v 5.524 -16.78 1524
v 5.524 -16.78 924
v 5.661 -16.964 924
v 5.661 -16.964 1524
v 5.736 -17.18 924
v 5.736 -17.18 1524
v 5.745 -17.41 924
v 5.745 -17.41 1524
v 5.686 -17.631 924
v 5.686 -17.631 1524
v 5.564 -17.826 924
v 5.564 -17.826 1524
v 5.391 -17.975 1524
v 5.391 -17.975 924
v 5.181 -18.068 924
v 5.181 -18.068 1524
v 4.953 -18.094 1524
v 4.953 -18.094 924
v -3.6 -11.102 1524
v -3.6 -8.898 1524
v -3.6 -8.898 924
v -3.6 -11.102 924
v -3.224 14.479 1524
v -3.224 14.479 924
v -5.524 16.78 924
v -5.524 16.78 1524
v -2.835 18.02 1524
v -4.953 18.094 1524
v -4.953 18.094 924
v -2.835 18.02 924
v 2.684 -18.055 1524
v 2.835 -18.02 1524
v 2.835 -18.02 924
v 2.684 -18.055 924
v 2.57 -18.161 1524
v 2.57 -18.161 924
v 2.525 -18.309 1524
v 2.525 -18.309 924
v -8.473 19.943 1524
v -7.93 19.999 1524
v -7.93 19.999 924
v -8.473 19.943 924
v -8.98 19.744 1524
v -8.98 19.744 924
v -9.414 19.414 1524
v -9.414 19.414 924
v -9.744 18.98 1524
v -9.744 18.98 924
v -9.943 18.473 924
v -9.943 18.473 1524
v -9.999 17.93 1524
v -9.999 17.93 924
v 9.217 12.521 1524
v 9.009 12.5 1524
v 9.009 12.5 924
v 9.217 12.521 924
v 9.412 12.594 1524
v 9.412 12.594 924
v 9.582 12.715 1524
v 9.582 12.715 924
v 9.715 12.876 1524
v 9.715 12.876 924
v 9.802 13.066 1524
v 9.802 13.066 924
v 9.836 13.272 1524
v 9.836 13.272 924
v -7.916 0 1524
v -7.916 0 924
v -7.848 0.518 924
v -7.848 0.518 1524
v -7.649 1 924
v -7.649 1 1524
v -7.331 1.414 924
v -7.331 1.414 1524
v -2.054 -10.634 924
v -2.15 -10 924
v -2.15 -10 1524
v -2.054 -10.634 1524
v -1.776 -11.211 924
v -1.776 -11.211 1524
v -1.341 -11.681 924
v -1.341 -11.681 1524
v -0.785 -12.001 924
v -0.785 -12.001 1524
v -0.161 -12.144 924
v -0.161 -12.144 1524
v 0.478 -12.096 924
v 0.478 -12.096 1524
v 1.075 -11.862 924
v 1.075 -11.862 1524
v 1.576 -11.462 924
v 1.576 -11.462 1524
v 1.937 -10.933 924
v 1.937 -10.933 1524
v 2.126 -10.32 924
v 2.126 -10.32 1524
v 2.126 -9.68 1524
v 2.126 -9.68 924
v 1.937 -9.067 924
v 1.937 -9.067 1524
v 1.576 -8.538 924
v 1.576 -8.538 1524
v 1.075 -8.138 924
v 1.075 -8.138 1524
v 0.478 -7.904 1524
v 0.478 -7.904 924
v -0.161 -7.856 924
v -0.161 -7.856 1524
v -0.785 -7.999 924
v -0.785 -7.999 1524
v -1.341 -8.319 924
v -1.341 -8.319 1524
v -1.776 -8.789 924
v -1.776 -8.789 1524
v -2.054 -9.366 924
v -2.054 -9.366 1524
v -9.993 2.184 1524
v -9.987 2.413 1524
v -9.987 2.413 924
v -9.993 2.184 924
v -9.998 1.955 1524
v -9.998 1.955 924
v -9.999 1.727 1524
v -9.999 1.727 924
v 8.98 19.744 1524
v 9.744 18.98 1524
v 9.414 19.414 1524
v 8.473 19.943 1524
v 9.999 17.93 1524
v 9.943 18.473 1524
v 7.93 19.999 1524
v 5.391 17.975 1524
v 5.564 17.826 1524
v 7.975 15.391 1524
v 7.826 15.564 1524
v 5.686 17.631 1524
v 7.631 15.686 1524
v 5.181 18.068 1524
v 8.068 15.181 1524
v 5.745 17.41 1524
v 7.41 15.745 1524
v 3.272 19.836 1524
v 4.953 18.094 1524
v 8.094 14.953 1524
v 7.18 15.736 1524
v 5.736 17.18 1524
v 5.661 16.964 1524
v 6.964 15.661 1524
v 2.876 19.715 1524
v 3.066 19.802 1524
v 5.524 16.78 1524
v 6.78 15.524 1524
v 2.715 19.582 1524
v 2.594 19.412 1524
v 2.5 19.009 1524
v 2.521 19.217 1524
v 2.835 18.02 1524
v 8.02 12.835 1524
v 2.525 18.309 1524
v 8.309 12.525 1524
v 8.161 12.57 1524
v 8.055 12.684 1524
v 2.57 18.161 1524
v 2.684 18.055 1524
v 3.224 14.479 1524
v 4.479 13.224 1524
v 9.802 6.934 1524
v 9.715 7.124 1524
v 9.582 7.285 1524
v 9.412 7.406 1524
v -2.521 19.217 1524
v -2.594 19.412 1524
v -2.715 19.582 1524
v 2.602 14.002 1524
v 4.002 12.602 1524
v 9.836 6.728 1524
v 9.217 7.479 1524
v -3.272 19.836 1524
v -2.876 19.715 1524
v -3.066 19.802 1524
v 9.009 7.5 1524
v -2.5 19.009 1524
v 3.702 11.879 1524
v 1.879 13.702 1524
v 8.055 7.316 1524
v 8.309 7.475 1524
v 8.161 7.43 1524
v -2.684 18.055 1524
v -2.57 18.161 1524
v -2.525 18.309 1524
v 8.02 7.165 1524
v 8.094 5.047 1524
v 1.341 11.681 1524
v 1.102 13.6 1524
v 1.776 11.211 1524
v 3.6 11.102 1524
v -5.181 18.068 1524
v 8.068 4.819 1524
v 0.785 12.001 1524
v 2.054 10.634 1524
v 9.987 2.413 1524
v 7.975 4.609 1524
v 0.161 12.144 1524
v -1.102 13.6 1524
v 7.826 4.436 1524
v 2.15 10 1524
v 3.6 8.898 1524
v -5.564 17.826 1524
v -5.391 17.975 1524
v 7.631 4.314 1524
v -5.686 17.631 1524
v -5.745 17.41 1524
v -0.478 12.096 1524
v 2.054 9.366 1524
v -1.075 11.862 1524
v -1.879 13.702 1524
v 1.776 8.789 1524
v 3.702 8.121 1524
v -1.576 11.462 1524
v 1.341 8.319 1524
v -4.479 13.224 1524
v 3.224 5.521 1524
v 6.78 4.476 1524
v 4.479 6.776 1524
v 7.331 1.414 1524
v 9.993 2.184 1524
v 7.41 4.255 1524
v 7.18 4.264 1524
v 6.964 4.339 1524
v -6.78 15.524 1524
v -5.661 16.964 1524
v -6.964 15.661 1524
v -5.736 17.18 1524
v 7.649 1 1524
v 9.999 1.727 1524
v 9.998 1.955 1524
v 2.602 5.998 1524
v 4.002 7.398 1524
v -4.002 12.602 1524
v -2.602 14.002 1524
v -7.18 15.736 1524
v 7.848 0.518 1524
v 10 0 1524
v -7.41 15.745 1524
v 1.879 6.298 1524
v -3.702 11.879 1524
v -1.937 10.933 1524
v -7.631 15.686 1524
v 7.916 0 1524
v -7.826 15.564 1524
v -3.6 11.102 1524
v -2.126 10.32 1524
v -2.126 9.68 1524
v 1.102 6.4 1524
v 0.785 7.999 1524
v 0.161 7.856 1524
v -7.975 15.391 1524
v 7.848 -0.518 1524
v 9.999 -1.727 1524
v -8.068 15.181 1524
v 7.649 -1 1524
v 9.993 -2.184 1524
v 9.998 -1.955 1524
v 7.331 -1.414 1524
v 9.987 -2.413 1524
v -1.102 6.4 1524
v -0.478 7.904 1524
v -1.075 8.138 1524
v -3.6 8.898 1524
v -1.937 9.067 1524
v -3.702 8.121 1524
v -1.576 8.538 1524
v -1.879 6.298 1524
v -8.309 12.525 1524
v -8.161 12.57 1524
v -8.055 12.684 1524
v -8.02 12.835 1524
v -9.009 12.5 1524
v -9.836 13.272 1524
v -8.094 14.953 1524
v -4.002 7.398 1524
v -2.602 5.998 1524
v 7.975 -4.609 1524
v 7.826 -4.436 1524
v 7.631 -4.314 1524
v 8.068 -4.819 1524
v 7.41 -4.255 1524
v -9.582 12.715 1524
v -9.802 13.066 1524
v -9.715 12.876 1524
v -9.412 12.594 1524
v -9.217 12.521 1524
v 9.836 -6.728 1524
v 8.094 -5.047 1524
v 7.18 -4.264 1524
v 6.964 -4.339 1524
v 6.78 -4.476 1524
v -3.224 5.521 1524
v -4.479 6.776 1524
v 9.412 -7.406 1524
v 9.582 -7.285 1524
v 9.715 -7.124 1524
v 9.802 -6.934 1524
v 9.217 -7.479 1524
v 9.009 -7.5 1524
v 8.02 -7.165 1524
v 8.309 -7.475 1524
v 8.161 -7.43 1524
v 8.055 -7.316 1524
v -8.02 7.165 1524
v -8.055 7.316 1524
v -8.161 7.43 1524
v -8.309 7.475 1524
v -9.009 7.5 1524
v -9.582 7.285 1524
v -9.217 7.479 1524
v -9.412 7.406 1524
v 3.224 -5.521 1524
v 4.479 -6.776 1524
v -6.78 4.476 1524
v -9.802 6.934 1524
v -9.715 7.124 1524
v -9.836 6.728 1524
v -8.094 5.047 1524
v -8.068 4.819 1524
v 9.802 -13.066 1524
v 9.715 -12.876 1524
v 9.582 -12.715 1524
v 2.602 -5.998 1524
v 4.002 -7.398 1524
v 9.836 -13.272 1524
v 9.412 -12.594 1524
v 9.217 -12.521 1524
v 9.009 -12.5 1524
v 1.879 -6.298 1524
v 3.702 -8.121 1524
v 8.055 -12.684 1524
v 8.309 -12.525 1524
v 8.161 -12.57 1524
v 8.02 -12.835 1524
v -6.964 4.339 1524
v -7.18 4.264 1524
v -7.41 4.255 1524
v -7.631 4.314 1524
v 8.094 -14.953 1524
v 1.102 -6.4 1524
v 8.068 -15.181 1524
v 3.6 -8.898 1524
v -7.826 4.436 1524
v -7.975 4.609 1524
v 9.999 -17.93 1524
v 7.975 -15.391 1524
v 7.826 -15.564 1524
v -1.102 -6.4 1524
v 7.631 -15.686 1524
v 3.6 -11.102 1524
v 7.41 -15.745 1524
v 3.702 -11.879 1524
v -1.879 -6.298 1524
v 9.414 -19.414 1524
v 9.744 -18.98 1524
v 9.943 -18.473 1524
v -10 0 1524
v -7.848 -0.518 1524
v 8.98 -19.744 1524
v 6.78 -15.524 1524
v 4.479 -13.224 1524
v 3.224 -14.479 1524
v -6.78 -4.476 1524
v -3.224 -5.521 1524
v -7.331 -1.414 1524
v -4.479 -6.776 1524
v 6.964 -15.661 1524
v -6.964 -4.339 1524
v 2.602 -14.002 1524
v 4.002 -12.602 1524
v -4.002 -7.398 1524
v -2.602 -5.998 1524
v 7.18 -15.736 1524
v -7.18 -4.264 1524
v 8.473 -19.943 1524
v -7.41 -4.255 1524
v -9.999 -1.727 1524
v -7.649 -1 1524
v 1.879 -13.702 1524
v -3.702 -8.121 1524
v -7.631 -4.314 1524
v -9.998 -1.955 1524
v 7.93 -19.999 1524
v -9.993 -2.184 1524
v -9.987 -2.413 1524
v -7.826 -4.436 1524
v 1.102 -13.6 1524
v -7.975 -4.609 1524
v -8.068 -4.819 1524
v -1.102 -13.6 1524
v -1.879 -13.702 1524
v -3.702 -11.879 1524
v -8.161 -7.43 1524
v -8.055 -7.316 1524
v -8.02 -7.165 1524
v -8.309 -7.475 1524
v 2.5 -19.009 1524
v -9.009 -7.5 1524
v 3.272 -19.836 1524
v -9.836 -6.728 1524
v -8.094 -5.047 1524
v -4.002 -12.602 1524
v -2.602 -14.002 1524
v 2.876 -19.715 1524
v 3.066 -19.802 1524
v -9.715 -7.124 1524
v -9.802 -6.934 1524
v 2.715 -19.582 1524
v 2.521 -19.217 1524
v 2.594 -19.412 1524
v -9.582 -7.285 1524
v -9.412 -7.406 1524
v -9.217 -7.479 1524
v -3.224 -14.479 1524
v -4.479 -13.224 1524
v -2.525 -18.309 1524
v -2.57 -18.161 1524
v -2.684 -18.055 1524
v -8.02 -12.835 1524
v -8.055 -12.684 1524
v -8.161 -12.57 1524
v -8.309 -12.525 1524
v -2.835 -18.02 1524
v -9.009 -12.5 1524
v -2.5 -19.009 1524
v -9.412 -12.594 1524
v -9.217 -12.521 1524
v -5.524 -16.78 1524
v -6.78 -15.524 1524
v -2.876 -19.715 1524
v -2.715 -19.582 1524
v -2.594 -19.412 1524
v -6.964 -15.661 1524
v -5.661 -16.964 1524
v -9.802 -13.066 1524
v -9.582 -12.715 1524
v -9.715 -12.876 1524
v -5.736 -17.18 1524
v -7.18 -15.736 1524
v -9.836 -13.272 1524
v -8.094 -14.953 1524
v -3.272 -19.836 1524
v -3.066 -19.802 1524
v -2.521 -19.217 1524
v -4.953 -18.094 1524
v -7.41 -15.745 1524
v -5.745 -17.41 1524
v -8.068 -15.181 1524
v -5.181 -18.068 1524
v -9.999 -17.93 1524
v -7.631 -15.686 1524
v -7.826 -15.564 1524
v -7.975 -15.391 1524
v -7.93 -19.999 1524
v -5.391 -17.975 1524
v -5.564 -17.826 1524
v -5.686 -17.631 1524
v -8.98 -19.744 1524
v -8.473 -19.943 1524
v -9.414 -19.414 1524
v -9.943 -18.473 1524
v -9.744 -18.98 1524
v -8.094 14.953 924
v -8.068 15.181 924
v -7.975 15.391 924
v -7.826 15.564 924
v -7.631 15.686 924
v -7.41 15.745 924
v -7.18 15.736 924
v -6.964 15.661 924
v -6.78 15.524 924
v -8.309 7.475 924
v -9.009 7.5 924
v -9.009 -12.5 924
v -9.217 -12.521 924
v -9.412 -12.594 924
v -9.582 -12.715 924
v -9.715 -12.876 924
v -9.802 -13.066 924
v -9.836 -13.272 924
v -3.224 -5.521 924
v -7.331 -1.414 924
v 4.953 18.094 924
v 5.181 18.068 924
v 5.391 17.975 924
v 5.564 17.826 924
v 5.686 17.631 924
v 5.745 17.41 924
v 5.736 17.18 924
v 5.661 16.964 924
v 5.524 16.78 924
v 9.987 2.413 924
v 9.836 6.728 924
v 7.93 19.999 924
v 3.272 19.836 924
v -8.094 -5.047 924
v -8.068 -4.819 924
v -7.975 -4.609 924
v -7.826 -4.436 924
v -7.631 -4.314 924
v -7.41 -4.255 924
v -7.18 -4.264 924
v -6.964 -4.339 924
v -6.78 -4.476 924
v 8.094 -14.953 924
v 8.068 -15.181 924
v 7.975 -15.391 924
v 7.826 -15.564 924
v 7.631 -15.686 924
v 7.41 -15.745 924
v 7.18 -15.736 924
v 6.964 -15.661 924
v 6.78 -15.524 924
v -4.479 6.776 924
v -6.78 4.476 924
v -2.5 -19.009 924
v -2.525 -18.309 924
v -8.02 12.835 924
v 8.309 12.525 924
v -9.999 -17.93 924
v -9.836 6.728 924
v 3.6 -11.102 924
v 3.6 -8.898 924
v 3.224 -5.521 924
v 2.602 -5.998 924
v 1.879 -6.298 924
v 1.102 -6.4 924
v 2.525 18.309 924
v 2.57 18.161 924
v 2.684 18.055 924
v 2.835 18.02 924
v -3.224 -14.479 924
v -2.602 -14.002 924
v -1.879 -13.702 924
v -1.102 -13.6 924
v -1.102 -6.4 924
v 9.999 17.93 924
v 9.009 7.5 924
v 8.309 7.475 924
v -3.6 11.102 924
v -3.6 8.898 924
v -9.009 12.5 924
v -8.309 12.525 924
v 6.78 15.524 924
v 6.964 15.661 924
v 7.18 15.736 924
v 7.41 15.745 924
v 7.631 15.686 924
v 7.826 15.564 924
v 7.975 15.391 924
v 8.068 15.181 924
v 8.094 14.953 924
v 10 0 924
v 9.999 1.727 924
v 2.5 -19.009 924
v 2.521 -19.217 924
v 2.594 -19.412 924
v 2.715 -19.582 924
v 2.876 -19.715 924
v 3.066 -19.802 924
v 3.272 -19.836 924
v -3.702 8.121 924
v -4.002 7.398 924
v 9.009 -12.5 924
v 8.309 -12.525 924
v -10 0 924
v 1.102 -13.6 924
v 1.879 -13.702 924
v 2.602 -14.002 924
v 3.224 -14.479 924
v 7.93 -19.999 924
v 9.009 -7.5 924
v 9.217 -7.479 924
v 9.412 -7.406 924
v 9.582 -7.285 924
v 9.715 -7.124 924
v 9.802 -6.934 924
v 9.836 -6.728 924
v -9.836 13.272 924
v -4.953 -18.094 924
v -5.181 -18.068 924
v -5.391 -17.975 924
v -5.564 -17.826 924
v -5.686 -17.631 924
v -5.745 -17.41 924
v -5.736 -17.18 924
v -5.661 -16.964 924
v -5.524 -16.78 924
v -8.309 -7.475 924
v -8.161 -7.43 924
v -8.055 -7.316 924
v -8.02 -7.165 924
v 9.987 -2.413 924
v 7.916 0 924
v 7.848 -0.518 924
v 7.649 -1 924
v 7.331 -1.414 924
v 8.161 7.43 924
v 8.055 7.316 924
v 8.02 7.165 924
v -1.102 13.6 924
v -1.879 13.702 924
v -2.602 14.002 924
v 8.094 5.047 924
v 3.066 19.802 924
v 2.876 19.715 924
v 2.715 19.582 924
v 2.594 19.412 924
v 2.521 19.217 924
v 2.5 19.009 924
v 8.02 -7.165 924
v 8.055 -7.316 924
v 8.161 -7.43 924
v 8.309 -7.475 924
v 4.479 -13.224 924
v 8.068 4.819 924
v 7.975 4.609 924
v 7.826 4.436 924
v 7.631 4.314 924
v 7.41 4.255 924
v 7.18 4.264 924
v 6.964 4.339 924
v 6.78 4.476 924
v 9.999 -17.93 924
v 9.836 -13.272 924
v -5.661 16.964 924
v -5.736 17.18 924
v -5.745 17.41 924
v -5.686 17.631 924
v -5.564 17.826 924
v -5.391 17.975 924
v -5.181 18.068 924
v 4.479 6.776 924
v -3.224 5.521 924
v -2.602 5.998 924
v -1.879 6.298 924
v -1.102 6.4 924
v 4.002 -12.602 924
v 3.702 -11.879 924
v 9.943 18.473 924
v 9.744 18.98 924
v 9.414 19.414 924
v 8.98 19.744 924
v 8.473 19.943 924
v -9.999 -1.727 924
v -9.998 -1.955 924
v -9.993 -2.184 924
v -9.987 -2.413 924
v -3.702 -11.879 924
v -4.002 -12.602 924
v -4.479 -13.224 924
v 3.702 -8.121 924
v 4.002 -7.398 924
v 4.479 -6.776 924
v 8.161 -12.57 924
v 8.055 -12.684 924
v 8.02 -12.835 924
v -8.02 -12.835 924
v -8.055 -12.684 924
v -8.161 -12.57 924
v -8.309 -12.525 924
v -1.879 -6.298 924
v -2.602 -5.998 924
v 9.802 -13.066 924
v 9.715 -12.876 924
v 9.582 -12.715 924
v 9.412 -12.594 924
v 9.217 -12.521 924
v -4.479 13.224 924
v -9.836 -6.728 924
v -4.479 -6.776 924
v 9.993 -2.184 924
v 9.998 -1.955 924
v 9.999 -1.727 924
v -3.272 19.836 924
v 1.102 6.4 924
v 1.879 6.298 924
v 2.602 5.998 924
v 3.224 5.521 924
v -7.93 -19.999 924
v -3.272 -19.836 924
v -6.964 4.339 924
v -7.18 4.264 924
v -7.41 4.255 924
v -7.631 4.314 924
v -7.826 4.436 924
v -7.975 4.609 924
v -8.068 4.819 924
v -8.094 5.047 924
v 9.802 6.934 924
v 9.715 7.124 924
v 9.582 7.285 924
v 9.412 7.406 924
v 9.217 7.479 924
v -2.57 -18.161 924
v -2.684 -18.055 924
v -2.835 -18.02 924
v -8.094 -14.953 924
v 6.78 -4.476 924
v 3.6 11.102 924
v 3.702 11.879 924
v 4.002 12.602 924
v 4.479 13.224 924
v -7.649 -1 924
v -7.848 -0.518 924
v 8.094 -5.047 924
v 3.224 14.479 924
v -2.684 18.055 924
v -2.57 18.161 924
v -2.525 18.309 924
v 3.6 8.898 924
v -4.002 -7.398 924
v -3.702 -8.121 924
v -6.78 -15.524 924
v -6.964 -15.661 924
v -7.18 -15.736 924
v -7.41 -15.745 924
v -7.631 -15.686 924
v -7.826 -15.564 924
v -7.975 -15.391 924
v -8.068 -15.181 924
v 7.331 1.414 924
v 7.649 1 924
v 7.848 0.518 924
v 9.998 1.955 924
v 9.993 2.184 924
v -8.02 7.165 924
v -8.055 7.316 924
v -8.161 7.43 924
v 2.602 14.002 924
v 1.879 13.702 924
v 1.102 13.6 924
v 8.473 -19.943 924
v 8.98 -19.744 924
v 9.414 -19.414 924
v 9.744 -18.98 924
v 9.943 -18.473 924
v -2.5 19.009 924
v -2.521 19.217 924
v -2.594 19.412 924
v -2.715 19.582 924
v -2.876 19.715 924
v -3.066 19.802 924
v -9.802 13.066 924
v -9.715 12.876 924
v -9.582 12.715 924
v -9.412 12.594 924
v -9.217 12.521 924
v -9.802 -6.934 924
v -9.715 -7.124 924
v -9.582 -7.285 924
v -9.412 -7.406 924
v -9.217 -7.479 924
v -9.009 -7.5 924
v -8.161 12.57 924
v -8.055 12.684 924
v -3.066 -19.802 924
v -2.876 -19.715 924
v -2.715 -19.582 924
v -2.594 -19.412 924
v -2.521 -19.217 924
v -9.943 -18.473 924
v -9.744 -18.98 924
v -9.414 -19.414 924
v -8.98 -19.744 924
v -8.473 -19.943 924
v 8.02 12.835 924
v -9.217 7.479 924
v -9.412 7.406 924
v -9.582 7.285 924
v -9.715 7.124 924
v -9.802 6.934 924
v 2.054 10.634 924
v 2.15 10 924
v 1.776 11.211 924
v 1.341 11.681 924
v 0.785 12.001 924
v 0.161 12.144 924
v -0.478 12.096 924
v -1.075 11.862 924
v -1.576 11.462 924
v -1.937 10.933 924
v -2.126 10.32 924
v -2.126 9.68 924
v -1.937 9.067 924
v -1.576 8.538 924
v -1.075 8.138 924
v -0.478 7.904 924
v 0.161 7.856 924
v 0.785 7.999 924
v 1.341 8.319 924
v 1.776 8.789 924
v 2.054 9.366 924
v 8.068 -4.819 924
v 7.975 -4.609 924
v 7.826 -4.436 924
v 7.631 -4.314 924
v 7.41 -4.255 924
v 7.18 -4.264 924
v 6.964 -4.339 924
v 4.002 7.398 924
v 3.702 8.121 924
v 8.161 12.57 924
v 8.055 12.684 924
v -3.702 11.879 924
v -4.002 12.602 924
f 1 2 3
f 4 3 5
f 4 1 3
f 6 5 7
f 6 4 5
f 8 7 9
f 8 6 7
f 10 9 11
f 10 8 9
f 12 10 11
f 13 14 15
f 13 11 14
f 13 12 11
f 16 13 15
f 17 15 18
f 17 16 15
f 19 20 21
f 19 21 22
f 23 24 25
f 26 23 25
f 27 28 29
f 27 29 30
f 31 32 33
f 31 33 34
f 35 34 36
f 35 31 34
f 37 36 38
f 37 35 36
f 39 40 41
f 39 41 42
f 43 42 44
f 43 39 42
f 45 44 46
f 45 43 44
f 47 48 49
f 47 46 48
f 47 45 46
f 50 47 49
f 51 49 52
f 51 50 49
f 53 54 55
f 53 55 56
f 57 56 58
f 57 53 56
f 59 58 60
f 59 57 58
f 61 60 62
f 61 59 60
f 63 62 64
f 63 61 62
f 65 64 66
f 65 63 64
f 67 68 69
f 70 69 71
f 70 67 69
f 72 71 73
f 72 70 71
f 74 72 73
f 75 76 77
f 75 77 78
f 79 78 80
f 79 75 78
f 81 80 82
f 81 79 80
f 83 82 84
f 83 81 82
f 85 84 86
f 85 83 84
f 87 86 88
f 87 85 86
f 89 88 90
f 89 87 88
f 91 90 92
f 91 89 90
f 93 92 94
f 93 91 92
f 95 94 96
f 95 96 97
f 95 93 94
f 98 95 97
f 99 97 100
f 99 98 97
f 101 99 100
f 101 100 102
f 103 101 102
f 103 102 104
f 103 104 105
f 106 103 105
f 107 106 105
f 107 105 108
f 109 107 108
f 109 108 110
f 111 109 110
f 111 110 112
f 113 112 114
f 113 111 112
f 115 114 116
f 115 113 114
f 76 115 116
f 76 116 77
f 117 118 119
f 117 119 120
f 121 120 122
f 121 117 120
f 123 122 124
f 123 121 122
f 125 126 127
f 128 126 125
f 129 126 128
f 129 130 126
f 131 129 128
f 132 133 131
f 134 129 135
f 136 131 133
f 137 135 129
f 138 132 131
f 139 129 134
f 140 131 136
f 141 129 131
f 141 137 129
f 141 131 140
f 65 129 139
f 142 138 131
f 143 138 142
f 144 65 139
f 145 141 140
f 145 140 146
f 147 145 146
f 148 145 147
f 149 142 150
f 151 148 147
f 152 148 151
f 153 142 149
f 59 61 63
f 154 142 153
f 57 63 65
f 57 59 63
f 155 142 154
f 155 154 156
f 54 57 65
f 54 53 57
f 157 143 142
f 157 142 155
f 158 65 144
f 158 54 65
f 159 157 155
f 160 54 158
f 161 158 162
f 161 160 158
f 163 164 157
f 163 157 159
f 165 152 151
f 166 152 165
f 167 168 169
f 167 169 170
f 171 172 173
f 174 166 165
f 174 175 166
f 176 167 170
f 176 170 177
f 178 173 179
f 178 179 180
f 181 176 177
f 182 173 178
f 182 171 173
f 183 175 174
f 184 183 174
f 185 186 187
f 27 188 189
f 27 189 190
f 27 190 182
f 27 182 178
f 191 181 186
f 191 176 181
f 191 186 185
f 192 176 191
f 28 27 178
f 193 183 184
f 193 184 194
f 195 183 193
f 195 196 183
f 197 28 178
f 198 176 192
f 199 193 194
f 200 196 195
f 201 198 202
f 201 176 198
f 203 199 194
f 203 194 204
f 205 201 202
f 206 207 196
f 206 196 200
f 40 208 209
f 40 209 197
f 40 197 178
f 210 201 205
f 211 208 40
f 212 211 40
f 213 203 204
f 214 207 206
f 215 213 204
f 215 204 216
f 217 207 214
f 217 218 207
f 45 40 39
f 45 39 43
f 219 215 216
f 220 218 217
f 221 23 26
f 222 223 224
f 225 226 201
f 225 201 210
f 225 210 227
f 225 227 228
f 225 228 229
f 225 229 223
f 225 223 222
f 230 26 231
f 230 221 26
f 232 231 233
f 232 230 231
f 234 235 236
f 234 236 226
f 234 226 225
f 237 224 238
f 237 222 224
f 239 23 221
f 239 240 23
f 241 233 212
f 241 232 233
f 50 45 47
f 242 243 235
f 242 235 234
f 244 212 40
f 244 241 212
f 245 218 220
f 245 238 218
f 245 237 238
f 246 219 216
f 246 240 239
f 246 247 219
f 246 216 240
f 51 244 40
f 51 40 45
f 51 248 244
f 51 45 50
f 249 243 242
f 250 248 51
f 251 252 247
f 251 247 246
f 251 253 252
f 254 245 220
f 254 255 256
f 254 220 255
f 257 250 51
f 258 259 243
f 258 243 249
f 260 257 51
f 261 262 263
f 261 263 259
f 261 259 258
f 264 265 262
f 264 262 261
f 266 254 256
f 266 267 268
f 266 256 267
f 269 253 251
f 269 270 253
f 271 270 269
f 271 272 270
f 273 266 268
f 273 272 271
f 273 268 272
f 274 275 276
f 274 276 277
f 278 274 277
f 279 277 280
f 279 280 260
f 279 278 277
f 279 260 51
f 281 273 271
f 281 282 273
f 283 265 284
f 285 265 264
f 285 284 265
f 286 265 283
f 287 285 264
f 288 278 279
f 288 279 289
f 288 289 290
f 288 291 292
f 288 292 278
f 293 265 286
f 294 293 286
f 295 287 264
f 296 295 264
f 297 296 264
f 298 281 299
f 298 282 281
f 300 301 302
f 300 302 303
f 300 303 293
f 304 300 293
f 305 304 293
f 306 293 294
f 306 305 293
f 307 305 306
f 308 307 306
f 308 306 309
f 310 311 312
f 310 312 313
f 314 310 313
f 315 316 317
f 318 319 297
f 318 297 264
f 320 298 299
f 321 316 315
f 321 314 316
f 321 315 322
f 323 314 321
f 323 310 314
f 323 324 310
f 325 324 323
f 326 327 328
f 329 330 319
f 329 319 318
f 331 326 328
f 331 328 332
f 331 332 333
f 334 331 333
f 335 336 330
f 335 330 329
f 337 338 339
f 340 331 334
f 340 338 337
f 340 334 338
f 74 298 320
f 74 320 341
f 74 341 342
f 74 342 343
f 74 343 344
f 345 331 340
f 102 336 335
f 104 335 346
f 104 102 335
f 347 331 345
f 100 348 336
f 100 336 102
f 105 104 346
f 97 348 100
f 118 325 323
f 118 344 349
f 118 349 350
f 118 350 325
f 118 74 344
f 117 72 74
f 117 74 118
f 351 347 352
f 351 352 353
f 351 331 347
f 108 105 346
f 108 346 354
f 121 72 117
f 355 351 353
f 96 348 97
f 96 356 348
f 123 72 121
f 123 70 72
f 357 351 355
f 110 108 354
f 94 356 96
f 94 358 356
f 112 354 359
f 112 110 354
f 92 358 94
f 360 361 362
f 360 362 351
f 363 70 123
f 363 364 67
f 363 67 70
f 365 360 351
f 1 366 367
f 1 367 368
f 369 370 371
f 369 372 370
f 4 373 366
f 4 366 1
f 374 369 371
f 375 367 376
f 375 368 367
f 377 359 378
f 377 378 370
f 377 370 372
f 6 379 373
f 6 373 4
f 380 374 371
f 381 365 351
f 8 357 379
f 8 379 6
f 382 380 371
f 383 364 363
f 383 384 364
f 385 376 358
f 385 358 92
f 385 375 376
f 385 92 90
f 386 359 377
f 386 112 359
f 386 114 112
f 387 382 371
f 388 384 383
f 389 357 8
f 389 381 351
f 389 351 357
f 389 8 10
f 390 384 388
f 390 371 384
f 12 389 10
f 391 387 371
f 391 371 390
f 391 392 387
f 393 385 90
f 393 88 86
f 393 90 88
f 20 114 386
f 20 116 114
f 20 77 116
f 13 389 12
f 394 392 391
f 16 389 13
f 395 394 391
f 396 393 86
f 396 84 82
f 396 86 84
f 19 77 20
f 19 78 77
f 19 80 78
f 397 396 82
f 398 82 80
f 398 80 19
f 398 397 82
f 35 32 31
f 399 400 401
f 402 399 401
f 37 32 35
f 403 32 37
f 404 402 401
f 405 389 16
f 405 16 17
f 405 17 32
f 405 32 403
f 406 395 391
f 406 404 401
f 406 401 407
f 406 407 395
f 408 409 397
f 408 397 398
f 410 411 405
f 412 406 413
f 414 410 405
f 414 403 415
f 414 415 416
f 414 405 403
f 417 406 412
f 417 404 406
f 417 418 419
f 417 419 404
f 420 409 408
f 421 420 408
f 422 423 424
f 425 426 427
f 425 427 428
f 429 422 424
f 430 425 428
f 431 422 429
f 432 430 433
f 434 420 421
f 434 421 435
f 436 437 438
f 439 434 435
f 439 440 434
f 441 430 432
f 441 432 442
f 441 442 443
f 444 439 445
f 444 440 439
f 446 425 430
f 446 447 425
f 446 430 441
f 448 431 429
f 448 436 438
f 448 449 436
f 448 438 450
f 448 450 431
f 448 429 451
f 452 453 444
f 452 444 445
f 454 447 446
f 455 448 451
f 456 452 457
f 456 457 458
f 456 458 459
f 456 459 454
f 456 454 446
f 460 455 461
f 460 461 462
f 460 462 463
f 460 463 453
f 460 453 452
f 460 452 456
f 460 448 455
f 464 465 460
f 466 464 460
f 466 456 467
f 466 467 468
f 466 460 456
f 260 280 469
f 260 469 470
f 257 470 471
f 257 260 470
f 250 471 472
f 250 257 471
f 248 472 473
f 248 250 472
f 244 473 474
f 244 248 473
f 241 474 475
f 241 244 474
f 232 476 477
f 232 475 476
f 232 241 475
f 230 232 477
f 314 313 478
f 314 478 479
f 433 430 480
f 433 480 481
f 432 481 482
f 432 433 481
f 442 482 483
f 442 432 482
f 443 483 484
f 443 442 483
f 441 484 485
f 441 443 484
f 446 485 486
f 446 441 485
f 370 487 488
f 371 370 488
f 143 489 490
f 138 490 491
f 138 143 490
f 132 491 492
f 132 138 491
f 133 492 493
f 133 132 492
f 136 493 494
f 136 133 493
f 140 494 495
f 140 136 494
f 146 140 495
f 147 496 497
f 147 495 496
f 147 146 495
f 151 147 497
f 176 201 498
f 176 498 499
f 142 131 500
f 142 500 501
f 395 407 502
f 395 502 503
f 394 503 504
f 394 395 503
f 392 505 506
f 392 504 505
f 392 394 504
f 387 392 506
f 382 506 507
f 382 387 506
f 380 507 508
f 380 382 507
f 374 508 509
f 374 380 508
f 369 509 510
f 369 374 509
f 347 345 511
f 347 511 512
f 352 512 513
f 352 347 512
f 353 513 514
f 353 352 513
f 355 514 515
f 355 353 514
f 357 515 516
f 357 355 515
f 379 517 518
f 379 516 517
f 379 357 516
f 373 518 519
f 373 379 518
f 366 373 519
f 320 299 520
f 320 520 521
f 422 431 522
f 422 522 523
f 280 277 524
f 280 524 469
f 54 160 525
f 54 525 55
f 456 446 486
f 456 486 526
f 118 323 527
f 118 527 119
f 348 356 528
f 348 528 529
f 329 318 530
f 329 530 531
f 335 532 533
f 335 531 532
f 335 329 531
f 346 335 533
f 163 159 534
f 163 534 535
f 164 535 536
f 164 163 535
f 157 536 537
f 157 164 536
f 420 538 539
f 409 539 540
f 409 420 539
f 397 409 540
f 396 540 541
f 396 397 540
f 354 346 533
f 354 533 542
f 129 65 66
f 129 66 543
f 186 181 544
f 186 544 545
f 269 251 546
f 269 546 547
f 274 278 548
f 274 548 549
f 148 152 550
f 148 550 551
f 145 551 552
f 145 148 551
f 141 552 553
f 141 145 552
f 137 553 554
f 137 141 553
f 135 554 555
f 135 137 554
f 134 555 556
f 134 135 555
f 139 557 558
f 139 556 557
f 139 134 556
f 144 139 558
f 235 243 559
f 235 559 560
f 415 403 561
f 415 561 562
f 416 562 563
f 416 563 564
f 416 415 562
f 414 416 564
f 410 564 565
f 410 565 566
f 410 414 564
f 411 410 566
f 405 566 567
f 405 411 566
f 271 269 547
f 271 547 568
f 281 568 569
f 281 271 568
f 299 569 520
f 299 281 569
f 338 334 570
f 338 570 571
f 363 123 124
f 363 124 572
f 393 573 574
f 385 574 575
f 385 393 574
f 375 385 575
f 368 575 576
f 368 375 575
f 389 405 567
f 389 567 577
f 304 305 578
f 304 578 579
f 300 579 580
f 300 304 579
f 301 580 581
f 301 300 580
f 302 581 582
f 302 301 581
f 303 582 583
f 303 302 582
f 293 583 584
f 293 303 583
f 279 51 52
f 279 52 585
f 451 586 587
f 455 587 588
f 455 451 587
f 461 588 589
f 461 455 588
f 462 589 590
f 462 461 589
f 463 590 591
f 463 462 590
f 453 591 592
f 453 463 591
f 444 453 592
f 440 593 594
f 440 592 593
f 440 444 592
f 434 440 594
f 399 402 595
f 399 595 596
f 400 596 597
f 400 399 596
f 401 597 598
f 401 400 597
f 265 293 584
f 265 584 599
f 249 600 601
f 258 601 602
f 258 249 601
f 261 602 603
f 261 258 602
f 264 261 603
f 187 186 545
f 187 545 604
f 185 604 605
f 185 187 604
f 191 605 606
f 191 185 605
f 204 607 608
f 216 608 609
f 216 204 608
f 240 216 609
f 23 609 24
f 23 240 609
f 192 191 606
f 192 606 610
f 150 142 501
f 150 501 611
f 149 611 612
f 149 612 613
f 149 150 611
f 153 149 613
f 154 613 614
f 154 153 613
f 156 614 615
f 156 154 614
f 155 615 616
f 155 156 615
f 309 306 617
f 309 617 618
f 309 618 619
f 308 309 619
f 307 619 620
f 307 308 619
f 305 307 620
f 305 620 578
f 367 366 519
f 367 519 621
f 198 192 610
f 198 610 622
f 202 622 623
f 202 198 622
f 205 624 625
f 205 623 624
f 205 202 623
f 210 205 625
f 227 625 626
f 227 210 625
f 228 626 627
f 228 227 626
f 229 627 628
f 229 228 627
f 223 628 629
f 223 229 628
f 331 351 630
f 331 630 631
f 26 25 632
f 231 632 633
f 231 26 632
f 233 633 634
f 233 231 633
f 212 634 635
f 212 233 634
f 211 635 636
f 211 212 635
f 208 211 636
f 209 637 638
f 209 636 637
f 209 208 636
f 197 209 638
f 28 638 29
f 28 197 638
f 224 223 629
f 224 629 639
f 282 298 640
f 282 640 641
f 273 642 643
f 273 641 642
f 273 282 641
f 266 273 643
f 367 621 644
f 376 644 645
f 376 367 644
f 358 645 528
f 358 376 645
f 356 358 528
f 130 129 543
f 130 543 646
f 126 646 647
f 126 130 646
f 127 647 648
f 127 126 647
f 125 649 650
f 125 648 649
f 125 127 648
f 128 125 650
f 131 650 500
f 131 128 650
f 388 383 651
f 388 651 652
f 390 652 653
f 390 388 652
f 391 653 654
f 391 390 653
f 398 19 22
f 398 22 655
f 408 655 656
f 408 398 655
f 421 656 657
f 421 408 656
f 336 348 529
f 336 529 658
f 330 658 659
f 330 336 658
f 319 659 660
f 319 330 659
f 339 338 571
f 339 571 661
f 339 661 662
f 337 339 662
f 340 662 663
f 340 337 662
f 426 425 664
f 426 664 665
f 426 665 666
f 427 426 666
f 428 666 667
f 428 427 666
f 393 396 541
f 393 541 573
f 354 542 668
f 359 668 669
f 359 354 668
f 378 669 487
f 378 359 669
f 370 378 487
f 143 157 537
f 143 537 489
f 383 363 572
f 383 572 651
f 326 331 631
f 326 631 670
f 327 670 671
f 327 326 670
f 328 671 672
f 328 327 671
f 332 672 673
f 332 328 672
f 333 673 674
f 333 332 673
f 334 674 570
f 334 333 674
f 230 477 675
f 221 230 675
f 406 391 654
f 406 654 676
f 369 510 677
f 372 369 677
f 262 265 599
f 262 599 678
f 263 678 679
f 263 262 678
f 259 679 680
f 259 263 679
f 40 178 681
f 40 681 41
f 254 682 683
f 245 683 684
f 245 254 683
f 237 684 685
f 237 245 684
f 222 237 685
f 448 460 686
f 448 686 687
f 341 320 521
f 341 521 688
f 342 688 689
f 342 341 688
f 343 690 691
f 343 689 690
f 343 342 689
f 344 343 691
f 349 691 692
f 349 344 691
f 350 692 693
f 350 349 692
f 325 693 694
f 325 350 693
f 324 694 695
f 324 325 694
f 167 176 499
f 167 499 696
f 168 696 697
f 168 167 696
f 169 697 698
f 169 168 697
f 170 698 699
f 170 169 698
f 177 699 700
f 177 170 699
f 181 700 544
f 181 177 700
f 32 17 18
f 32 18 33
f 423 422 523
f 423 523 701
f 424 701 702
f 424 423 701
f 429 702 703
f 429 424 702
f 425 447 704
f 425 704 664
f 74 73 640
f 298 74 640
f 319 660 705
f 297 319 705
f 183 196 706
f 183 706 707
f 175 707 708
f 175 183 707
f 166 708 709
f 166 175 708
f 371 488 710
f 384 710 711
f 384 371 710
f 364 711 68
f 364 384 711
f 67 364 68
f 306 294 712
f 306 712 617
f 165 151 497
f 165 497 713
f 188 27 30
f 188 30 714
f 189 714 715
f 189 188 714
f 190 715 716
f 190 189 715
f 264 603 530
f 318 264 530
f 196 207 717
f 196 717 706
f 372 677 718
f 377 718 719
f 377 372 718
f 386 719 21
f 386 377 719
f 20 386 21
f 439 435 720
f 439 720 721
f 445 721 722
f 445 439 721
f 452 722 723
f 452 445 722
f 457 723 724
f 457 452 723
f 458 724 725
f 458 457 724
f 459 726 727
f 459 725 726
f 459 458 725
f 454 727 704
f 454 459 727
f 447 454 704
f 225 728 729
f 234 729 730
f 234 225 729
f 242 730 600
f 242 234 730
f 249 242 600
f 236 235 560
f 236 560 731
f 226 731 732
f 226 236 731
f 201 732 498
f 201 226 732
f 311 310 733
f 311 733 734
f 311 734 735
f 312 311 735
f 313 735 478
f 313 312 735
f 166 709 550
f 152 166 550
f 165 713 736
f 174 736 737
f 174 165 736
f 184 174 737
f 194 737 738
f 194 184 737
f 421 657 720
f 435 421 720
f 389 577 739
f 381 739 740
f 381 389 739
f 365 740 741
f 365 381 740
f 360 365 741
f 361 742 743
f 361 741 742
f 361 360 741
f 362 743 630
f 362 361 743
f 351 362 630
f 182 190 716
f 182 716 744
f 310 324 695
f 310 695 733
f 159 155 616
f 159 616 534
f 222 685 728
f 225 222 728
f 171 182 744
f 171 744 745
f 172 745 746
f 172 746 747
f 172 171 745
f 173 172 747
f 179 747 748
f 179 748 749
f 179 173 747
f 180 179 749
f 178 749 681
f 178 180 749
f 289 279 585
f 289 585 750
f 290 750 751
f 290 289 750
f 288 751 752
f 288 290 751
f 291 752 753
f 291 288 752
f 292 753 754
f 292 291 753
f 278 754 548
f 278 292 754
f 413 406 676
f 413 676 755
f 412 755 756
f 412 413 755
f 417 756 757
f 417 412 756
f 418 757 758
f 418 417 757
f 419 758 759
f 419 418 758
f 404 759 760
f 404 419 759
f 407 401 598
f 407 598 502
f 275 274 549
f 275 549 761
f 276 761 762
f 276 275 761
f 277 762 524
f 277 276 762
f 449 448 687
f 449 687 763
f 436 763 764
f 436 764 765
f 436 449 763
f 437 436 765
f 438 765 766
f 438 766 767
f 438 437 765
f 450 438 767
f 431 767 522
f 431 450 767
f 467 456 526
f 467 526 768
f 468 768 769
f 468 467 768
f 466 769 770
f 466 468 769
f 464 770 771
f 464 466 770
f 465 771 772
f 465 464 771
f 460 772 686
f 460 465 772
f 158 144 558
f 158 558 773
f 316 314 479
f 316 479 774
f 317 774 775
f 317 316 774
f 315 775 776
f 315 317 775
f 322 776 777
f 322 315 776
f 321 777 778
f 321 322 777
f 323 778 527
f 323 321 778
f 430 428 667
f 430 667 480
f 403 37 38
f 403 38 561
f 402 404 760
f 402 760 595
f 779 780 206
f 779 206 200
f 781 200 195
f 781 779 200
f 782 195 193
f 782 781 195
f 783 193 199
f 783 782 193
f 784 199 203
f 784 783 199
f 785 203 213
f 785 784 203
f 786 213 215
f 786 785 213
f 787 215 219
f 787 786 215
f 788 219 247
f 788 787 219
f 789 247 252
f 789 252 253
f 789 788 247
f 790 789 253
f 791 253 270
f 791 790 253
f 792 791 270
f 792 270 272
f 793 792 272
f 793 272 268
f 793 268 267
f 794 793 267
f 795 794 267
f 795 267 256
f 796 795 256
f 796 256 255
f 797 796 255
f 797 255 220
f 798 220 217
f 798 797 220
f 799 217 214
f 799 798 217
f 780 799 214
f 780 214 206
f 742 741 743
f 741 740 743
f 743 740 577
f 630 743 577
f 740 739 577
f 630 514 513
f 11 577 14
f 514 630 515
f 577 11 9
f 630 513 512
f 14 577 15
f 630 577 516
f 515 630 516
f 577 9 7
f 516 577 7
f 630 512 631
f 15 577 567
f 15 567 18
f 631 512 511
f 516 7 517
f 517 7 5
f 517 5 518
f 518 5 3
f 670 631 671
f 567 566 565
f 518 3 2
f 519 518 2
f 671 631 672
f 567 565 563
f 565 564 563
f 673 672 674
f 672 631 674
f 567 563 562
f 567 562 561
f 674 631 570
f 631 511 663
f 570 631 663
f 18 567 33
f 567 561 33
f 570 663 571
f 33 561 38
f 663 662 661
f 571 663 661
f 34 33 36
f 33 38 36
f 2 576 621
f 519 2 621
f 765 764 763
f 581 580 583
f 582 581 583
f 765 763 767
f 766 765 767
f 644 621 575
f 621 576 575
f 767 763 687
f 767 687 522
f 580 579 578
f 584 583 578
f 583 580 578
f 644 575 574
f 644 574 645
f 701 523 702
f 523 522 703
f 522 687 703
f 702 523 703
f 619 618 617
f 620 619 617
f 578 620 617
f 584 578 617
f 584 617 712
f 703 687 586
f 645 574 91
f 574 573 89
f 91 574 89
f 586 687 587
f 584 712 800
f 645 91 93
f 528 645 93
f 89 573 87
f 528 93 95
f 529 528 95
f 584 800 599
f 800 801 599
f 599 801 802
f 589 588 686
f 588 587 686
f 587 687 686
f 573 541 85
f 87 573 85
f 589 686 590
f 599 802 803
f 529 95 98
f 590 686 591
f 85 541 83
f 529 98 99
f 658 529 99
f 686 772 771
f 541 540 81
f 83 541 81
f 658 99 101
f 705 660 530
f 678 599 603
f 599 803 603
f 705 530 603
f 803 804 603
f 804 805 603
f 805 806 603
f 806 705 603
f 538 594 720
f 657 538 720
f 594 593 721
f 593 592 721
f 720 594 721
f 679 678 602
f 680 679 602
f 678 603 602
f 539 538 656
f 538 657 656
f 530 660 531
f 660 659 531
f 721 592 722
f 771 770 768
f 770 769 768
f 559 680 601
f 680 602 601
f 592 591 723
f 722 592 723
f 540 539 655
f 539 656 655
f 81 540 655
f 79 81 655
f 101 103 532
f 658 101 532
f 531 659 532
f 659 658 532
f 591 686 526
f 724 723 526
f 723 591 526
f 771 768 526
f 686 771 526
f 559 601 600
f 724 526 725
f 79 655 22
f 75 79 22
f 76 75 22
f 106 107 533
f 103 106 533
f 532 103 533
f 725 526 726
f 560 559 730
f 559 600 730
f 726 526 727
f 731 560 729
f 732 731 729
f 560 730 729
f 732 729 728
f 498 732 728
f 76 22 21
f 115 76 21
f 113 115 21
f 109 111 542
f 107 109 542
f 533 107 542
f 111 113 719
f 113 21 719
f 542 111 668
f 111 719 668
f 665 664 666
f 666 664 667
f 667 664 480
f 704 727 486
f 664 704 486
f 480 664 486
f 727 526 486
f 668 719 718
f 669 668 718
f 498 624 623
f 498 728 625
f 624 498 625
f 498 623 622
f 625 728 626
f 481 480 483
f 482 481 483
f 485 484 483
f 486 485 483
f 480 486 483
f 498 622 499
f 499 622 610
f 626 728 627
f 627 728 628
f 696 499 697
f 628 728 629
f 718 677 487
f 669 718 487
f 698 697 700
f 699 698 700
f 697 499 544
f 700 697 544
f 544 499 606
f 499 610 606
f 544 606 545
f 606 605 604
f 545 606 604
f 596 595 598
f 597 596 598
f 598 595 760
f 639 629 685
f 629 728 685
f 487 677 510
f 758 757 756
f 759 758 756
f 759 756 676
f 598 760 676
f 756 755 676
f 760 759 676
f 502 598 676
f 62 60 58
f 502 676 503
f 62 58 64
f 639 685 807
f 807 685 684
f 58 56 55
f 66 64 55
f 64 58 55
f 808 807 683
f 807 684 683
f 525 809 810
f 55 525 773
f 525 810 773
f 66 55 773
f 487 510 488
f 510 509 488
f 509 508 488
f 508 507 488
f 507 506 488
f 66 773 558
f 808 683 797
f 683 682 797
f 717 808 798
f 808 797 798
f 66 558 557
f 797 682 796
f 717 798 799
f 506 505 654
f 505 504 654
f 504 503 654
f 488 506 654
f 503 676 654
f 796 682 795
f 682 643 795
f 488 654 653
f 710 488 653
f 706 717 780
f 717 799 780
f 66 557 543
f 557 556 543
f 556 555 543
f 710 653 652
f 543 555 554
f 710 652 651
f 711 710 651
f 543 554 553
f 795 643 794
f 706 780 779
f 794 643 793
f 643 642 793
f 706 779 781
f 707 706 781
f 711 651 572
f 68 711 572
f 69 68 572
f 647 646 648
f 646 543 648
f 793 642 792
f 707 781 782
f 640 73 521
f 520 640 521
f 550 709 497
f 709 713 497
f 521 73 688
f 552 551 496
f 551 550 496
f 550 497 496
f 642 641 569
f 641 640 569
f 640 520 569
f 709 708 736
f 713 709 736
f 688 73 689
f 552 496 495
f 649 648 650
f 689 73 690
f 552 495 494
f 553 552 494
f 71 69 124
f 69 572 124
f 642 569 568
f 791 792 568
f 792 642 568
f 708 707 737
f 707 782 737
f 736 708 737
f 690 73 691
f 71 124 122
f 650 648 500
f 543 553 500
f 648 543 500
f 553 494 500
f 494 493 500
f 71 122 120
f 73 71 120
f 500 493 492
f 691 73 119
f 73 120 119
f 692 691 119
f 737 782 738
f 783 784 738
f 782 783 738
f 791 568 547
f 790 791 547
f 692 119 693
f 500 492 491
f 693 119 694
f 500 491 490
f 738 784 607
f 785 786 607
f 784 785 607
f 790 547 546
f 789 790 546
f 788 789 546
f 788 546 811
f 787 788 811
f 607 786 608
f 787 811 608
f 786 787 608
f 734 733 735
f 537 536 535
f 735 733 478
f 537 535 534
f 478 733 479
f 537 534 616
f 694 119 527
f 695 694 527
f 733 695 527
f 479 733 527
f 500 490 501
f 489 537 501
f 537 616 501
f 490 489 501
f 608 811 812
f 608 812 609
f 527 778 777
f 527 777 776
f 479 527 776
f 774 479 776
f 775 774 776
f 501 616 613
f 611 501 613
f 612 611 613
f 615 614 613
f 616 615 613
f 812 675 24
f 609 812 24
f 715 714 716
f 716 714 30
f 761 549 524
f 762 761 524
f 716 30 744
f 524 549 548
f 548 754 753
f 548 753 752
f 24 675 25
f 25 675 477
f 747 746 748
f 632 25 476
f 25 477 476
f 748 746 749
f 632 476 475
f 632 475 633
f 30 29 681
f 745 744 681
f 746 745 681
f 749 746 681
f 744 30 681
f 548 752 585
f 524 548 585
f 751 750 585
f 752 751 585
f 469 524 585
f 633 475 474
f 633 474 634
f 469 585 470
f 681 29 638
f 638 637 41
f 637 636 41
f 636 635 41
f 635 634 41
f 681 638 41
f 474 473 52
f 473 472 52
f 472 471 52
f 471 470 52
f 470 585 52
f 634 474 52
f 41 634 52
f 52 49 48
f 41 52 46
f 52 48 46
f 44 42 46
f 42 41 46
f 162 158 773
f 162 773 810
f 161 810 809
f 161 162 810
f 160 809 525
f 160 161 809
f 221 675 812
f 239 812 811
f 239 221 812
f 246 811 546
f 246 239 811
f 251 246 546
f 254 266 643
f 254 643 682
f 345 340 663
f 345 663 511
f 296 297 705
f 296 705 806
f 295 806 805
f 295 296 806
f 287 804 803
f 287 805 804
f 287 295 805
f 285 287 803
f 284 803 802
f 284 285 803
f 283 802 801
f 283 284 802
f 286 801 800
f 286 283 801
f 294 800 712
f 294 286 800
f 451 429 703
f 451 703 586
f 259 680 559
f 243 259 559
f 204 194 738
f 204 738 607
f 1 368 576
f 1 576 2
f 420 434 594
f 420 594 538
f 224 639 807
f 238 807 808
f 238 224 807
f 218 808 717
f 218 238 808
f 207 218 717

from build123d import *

# Parameters (mm, degrees)
SKETCH3_R               = 2.15
BOSS_EXTRUDE1_DEPTH     = 1524
CIRPATTERN1_COUNT       = 2
CUT_EXTRUDE1_DEPTH      = 10
CUT_EXTRUDE1_DEPTH_BACK = 23
SKETCH4_OUTSIDE_W       = 3659.666
SKETCH4_OUTSIDE_H       = 651.666
SKETCH4_OUTSIDE_W_2     = 600
SKETCH4_OUTSIDE_H_2     = 40


with BuildPart() as part:
    # Sketch3 → Boss-Extrude1 (new, symmetric)
    with BuildSketch(Plane.XY):
        with BuildLine():
            Line((-8.30911066, 7.475083014), (-9.008684239, 7.499512662))
            ThreePointArc((-9.008684239, 7.499512662), (-9.582202525, 7.285082961), (-9.836116498, 6.727919597))
            Line((-9.836116498, 6.727919597), (-9.986803685, 2.412803152))
            ThreePointArc((-9.986803685, 2.412803152), (-9.995837451, 2.069746735), (-9.99898368, 1.726585818))
            Line((-9.99898368, 1.726585818), (-10, 0))
            Line((-10, 0), (-7.916458339, 0))
            ThreePointArc((-7.916458339, 0), (-7.764217404, 0.765366865), (-7.330671901, 1.414213562))
            Line((-7.330671901, 1.414213562), (-3.22356512, 5.521320344))
            ThreePointArc((-3.22356512, 5.521320344), (-2.250295073, 6.171638598), (-1.102244776, 6.4))
            Line((-1.102244776, 6.4), (1.102244776, 6.4))
            ThreePointArc((1.102244776, 6.4), (2.250295073, 6.171638598), (3.22356512, 5.521320344))
            Line((3.22356512, 5.521320344), (7.330671901, 1.414213562))
            ThreePointArc((7.330671901, 1.414213562), (7.764217404, 0.765366865), (7.916458339, 0))
            Line((7.916458339, 0), (10, 0))
            Line((10, 0), (9.99898368, 1.726585818))
            ThreePointArc((9.99898368, 1.726585818), (9.995837451, 2.069746735), (9.986803685, 2.412803152))
            Line((9.986803685, 2.412803152), (9.836116498, 6.727919597))
            ThreePointArc((9.836116498, 6.727919597), (9.582202525, 7.285082961), (9.008684239, 7.499512662))
            Line((9.008684239, 7.499512662), (8.30911066, 7.475083014))
            ThreePointArc((8.30911066, 7.475083014), (8.100174399, 7.379865274), (8.019763261, 7.164795917))
            Line((8.019763261, 7.164795917), (8.093719461, 5.046967452))
            ThreePointArc((8.093719461, 5.046967452), (7.631170264, 4.313871343), (6.779559917, 4.47555462))
            Line((6.779559917, 4.47555462), (4.478679656, 6.77643488))
            ThreePointArc((4.478679656, 6.77643488), (3.828361402, 7.749704927), (3.6, 8.897755224))
            Line((3.6, 8.897755224), (3.6, 11.102244776))
            ThreePointArc((3.6, 11.102244776), (3.828361402, 12.250295073), (4.478679656, 13.22356512))
            Line((4.478679656, 13.22356512), (6.779559917, 15.52444538))
            ThreePointArc((6.779559917, 15.52444538), (7.631170264, 15.686128657), (8.093719461, 14.953032548))
            Line((8.093719461, 14.953032548), (8.019763261, 12.835204083))
            ThreePointArc((8.019763261, 12.835204083), (8.100174399, 12.620134726), (8.30911066, 12.524916986))
            Line((8.30911066, 12.524916986), (9.008684239, 12.500487338))
            ThreePointArc((9.008684239, 12.500487338), (9.582202525, 12.714917039), (9.836116498, 13.272080403))
            Line((9.836116498, 13.272080403), (9.998781654, 17.930201007))
            ThreePointArc((9.998781654, 17.930201007), (9.414213562, 19.414213562), (7.930201007, 19.998781654))
            Line((7.930201007, 19.998781654), (3.272080403, 19.836116498))
            ThreePointArc((3.272080403, 19.836116498), (2.714917039, 19.582202525), (2.500487338, 19.008684239))
            Line((2.500487338, 19.008684239), (2.524916986, 18.30911066))
            ThreePointArc((2.524916986, 18.30911066), (2.620134726, 18.100174399), (2.835204083, 18.019763261))
            Line((2.835204083, 18.019763261), (4.953032548, 18.093719461))
            ThreePointArc((4.953032548, 18.093719461), (5.686128657, 17.631170264), (5.52444538, 16.779559917))
            Line((5.52444538, 16.779559917), (3.22356512, 14.478679656))
            ThreePointArc((3.22356512, 14.478679656), (2.250295073, 13.828361402), (1.102244776, 13.6))
            Line((1.102244776, 13.6), (-1.102244776, 13.6))
            ThreePointArc((-1.102244776, 13.6), (-2.250295073, 13.828361402), (-3.22356512, 14.478679656))
            Line((-3.22356512, 14.478679656), (-5.52444538, 16.779559917))
            ThreePointArc((-5.52444538, 16.779559917), (-5.686128657, 17.631170264), (-4.953032548, 18.093719461))
            Line((-4.953032548, 18.093719461), (-2.835204083, 18.019763261))
            ThreePointArc((-2.835204083, 18.019763261), (-2.620134726, 18.100174399), (-2.524916986, 18.30911066))
            Line((-2.524916986, 18.30911066), (-2.500487338, 19.008684239))
            ThreePointArc((-2.500487338, 19.008684239), (-2.714917039, 19.582202525), (-3.272080403, 19.836116498))
            Line((-3.272080403, 19.836116498), (-7.930201007, 19.998781654))
            ThreePointArc((-7.930201007, 19.998781654), (-9.414213562, 19.414213562), (-9.998781654, 17.930201007))
            Line((-9.998781654, 17.930201007), (-9.836116498, 13.272080403))
            ThreePointArc((-9.836116498, 13.272080403), (-9.582202525, 12.714917039), (-9.008684239, 12.500487338))
            Line((-9.008684239, 12.500487338), (-8.30911066, 12.524916986))
            ThreePointArc((-8.30911066, 12.524916986), (-8.100174399, 12.620134726), (-8.019763261, 12.835204083))
            Line((-8.019763261, 12.835204083), (-8.093719461, 14.953032548))
            ThreePointArc((-8.093719461, 14.953032548), (-7.631170264, 15.686128657), (-6.779559917, 15.52444538))
            Line((-6.779559917, 15.52444538), (-4.478679656, 13.22356512))
            ThreePointArc((-4.478679656, 13.22356512), (-3.828361402, 12.250295073), (-3.6, 11.102244776))
            Line((-3.6, 11.102244776), (-3.6, 8.897755224))
            ThreePointArc((-3.6, 8.897755224), (-3.828361402, 7.749704927), (-4.478679656, 6.77643488))
            Line((-4.478679656, 6.77643488), (-6.779559917, 4.47555462))
            ThreePointArc((-6.779559917, 4.47555462), (-7.631170264, 4.313871343), (-8.093719461, 5.046967452))
            Line((-8.093719461, 5.046967452), (-8.019763261, 7.164795917))
            ThreePointArc((-8.019763261, 7.164795917), (-8.100174399, 7.379865274), (-8.30911066, 7.475083014))
        make_face()
        with Locations((0, 10)):
            Circle(SKETCH3_R, mode=Mode.SUBTRACT)
    boss_extrude1 = extrude(amount=BOSS_EXTRUDE1_DEPTH, both=True)

    # CirPattern1: Boss-Extrude1 ×2 about axis
    cirpattern1_axis = Axis((0, 0, 0), (0, 0, 1))
    for i in range(1, CIRPATTERN1_COUNT):
        add(boss_extrude1.rotate(cirpattern1_axis, i * 360 / CIRPATTERN1_COUNT))

    # Sketch4 outside → Cut-Extrude1 (cut, two sides: drawn at the far end of the back side and taken through both)
    with BuildSketch(Plane(origin=(3.6, 0, 0), x_dir=(0, 0, -1), z_dir=(1, 0, 0)).offset(-CUT_EXTRUDE1_DEPTH_BACK)):
        Rectangle(SKETCH4_OUTSIDE_W, SKETCH4_OUTSIDE_H)
        with Locations((-1224, 0)):
            Rectangle(SKETCH4_OUTSIDE_W_2, SKETCH4_OUTSIDE_H_2, mode=Mode.SUBTRACT)
    extrude(amount=CUT_EXTRUDE1_DEPTH + CUT_EXTRUDE1_DEPTH_BACK, mode=Mode.SUBTRACT)


solid = part.part
